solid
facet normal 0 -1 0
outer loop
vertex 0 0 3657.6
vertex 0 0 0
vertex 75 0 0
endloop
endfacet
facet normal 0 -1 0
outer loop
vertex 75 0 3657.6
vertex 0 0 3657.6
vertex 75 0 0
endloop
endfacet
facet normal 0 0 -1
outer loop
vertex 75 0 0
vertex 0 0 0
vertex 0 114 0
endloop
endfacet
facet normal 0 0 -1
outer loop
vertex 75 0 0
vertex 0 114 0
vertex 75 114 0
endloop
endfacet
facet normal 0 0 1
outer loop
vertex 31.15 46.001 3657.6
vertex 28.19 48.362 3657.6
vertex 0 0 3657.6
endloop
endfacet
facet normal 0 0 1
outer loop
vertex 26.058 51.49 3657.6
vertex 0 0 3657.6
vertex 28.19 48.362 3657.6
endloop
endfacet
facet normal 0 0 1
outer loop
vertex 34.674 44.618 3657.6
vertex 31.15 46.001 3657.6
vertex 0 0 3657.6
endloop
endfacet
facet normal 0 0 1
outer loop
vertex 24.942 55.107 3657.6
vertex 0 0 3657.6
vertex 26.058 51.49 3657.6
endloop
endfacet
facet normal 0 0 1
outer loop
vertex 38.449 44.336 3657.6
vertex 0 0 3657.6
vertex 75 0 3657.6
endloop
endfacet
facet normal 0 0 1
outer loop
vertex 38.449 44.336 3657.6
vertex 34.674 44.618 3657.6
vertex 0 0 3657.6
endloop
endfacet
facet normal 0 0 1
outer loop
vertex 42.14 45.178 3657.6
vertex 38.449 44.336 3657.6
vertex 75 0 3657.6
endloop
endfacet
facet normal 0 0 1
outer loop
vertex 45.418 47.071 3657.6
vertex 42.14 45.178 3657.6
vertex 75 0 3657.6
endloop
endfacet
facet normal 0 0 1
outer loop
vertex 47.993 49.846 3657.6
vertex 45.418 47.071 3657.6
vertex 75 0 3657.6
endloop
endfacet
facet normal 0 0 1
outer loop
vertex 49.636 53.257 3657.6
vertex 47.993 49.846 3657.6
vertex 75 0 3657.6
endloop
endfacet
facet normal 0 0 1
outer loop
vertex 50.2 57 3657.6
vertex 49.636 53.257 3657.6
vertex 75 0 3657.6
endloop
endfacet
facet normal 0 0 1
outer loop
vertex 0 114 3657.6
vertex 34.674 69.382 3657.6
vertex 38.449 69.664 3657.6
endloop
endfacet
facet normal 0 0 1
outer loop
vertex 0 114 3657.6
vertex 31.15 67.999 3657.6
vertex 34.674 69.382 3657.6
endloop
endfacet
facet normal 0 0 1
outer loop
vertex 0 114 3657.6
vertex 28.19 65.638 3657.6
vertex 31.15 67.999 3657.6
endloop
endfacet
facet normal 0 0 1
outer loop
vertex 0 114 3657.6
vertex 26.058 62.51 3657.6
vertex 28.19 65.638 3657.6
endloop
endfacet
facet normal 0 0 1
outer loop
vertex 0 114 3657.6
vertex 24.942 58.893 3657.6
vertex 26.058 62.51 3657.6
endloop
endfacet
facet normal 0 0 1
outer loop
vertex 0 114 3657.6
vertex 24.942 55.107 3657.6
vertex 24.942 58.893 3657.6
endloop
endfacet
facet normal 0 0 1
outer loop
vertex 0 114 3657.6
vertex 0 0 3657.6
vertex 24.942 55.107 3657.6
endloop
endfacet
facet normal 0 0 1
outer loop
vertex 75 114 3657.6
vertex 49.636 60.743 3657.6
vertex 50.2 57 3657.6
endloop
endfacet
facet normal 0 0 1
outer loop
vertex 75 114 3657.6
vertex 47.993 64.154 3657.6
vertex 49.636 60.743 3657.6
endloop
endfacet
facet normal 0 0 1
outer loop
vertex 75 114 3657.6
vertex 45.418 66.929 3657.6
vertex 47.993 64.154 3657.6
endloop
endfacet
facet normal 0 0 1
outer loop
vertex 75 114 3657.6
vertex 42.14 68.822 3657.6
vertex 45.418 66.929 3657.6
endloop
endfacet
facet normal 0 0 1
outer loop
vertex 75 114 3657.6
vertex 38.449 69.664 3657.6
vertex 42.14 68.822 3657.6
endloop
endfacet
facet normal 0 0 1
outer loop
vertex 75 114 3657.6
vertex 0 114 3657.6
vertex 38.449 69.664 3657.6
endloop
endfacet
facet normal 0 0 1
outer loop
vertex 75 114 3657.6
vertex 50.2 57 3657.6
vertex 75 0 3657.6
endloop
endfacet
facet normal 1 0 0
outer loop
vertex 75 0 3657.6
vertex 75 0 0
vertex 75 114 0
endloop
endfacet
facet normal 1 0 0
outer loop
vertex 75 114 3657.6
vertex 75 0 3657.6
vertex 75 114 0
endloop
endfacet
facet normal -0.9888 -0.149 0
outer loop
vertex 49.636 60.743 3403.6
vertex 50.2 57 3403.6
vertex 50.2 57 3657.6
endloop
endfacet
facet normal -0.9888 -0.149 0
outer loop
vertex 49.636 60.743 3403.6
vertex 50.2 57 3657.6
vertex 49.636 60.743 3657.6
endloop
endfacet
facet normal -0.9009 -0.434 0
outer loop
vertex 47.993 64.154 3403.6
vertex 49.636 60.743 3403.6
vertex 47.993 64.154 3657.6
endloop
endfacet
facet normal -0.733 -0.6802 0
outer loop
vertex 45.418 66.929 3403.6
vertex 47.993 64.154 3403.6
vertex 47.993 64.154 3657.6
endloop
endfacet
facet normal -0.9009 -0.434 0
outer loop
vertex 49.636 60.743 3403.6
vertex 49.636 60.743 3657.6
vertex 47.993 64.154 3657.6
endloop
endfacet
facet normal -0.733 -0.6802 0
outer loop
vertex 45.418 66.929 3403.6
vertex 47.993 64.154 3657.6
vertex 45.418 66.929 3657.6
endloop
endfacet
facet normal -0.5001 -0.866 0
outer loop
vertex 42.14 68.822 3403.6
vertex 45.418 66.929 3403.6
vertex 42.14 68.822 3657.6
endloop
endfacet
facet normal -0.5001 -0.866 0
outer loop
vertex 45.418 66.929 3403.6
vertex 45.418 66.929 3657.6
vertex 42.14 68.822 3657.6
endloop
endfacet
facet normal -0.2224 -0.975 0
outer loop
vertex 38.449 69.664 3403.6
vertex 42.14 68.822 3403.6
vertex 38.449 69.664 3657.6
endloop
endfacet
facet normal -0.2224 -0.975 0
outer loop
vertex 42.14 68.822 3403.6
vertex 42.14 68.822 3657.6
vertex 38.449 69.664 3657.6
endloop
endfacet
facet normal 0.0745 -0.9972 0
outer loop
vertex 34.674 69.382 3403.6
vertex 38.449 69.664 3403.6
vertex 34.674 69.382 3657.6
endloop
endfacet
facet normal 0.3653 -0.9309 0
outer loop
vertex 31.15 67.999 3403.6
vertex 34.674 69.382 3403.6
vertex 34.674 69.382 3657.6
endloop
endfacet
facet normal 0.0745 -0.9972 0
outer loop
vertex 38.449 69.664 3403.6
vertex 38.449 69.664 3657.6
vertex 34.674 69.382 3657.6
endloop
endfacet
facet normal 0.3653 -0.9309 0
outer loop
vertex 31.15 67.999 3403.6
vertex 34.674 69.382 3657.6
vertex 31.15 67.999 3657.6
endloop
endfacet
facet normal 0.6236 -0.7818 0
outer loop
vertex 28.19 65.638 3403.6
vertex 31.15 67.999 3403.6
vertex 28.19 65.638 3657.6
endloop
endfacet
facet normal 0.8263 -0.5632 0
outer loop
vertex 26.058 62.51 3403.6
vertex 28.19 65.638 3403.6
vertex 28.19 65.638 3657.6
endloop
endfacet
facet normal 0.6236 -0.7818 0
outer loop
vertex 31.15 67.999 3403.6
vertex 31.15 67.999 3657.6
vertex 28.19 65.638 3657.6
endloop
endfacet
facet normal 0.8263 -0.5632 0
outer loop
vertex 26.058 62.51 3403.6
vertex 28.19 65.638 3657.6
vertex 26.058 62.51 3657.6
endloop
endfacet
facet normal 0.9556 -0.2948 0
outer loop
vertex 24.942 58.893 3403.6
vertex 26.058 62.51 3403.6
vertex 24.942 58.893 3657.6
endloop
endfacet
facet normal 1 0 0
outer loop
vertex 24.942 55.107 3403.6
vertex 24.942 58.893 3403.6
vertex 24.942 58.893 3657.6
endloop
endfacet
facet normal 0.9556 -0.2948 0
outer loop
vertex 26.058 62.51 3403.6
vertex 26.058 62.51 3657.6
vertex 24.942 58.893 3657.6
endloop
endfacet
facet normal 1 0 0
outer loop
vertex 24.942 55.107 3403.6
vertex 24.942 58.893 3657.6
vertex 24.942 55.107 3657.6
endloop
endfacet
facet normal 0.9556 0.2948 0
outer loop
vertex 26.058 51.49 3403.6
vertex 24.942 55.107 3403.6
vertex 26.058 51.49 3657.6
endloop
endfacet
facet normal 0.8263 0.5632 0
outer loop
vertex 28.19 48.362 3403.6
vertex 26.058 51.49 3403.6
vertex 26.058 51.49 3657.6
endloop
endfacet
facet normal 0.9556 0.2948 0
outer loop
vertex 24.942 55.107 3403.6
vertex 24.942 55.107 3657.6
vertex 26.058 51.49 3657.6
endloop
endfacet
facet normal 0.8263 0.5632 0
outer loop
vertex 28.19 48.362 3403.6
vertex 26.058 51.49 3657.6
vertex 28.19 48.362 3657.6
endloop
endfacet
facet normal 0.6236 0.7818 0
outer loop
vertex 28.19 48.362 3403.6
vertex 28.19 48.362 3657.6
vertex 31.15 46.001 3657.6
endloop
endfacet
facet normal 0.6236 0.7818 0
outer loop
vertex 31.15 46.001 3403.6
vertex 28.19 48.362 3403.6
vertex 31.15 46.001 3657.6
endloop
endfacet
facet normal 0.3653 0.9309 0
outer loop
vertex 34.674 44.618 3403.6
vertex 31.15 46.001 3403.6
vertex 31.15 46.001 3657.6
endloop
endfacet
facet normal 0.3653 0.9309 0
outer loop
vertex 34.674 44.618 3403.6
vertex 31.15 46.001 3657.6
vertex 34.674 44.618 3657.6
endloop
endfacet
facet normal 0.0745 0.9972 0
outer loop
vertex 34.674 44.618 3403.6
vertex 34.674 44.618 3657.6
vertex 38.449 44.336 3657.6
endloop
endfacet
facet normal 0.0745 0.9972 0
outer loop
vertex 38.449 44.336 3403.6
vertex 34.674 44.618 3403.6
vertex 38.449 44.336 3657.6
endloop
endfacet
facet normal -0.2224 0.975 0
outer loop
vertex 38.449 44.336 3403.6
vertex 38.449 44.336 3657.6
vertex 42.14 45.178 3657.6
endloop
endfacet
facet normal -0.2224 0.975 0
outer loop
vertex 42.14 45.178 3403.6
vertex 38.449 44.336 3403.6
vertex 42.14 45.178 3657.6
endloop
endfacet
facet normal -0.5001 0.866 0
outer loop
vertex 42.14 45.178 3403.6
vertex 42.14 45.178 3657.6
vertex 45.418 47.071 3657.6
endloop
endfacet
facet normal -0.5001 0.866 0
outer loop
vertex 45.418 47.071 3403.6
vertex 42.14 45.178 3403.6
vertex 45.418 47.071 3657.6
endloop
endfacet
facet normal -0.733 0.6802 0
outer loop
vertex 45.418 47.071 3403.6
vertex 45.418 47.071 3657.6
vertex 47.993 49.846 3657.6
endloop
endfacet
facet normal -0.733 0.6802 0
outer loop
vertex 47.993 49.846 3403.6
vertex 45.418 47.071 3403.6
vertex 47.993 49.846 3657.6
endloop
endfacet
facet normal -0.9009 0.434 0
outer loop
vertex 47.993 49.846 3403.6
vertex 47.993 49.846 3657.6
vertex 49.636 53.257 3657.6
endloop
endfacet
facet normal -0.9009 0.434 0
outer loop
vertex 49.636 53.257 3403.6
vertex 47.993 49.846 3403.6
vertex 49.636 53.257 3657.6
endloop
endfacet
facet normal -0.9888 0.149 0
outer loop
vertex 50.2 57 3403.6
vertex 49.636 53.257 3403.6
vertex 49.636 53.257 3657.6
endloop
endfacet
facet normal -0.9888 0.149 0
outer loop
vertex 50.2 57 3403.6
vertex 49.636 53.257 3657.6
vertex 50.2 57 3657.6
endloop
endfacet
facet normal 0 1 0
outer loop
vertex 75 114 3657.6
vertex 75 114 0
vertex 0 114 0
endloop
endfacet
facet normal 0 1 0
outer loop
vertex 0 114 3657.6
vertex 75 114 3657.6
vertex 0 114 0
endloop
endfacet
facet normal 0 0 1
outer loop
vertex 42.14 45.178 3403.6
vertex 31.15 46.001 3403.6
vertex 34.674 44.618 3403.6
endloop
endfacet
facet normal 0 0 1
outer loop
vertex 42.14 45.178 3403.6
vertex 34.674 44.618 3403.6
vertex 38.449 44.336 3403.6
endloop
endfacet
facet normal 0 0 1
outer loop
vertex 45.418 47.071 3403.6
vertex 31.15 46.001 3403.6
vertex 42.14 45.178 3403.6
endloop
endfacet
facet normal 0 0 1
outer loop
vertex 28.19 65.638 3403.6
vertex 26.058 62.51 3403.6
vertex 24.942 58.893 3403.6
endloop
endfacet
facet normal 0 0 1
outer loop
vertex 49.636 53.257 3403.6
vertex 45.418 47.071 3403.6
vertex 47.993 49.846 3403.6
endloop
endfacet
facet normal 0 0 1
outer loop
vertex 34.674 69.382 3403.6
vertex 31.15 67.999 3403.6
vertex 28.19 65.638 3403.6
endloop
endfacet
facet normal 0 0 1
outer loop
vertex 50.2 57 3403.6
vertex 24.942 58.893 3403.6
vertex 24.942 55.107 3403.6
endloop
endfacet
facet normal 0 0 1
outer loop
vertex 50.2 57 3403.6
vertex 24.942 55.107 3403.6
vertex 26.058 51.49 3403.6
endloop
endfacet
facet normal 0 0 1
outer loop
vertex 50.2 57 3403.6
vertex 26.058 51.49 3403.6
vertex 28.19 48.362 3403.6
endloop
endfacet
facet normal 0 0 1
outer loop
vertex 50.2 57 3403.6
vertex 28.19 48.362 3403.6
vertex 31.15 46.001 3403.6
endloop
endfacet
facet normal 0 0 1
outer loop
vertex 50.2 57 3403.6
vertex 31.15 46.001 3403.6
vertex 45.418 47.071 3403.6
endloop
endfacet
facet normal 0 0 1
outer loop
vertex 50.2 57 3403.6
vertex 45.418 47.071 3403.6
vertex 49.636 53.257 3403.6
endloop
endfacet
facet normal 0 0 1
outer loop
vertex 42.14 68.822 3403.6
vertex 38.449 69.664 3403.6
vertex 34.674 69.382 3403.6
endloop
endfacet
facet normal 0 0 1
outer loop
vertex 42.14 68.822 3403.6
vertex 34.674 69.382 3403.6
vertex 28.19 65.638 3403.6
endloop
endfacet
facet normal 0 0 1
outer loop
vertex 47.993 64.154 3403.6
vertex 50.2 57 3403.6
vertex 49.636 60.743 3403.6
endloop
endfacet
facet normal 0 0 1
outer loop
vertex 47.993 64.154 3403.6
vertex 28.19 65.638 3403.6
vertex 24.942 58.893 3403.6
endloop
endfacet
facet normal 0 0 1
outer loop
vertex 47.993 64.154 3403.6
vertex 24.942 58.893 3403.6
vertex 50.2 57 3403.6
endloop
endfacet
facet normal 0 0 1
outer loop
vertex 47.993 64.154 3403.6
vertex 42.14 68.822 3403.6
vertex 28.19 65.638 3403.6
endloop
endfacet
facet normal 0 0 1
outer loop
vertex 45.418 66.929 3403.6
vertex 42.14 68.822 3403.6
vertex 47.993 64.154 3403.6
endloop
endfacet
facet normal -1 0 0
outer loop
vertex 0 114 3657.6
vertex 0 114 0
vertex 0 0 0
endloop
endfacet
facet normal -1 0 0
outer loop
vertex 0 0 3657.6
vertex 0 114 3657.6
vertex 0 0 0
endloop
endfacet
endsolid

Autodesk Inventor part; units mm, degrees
ref_plane "YZ Plane" through (0, 0, 0) normal (1, 0, 0) x (0, 1, 0)
ref_plane "XZ Plane" through (0, 0, 0) normal (0, 1, 0) x (-1, 0, 0)
ref_plane "XY Plane" through (0, 0, 0) normal (0, 0, 1) x (1, 0, 0)
sketch "Sketch1" plane through (0, 0, 0) normal (0, 0, 1) x (1, 0, 0)
  line L0 (0, 0) -> (75, 0)
  line L1 (75, 0) -> (75, 114)
  line L2 (75, 114) -> (0, 114)
  line L3 (0, 114) -> (0, 0)
  dimension "d0" = 75
  dimension "d1" = 114
extrude "Extrusion1" add sketch "Sketch1" along normal blind 3657.6
sketch "Sketch4" plane through (0, 0, 3657.6) normal (0, 0, 1) x (1, 0, 0)
  circle A0 centre (37.5, 57) radius 12.7
  line L0 (0, 0) -> (75, 0) projected
  line L1 (75, 0) -> (75, 114) projected
  line L2 (75, 114) -> (0, 114) projected
  line L3 (0, 114) -> (0, 0) projected
  line L4 (37.5, 114) -> (37.5, 0) construction
  line L5 (0, 57) -> (75, 57) construction
  dimension "d16" = 25.4
extrude "Extrusion4" cut sketch "Sketch4" against normal blind 254 contours A0
properties part number "2p3post" material "Wood (Walnut)"
